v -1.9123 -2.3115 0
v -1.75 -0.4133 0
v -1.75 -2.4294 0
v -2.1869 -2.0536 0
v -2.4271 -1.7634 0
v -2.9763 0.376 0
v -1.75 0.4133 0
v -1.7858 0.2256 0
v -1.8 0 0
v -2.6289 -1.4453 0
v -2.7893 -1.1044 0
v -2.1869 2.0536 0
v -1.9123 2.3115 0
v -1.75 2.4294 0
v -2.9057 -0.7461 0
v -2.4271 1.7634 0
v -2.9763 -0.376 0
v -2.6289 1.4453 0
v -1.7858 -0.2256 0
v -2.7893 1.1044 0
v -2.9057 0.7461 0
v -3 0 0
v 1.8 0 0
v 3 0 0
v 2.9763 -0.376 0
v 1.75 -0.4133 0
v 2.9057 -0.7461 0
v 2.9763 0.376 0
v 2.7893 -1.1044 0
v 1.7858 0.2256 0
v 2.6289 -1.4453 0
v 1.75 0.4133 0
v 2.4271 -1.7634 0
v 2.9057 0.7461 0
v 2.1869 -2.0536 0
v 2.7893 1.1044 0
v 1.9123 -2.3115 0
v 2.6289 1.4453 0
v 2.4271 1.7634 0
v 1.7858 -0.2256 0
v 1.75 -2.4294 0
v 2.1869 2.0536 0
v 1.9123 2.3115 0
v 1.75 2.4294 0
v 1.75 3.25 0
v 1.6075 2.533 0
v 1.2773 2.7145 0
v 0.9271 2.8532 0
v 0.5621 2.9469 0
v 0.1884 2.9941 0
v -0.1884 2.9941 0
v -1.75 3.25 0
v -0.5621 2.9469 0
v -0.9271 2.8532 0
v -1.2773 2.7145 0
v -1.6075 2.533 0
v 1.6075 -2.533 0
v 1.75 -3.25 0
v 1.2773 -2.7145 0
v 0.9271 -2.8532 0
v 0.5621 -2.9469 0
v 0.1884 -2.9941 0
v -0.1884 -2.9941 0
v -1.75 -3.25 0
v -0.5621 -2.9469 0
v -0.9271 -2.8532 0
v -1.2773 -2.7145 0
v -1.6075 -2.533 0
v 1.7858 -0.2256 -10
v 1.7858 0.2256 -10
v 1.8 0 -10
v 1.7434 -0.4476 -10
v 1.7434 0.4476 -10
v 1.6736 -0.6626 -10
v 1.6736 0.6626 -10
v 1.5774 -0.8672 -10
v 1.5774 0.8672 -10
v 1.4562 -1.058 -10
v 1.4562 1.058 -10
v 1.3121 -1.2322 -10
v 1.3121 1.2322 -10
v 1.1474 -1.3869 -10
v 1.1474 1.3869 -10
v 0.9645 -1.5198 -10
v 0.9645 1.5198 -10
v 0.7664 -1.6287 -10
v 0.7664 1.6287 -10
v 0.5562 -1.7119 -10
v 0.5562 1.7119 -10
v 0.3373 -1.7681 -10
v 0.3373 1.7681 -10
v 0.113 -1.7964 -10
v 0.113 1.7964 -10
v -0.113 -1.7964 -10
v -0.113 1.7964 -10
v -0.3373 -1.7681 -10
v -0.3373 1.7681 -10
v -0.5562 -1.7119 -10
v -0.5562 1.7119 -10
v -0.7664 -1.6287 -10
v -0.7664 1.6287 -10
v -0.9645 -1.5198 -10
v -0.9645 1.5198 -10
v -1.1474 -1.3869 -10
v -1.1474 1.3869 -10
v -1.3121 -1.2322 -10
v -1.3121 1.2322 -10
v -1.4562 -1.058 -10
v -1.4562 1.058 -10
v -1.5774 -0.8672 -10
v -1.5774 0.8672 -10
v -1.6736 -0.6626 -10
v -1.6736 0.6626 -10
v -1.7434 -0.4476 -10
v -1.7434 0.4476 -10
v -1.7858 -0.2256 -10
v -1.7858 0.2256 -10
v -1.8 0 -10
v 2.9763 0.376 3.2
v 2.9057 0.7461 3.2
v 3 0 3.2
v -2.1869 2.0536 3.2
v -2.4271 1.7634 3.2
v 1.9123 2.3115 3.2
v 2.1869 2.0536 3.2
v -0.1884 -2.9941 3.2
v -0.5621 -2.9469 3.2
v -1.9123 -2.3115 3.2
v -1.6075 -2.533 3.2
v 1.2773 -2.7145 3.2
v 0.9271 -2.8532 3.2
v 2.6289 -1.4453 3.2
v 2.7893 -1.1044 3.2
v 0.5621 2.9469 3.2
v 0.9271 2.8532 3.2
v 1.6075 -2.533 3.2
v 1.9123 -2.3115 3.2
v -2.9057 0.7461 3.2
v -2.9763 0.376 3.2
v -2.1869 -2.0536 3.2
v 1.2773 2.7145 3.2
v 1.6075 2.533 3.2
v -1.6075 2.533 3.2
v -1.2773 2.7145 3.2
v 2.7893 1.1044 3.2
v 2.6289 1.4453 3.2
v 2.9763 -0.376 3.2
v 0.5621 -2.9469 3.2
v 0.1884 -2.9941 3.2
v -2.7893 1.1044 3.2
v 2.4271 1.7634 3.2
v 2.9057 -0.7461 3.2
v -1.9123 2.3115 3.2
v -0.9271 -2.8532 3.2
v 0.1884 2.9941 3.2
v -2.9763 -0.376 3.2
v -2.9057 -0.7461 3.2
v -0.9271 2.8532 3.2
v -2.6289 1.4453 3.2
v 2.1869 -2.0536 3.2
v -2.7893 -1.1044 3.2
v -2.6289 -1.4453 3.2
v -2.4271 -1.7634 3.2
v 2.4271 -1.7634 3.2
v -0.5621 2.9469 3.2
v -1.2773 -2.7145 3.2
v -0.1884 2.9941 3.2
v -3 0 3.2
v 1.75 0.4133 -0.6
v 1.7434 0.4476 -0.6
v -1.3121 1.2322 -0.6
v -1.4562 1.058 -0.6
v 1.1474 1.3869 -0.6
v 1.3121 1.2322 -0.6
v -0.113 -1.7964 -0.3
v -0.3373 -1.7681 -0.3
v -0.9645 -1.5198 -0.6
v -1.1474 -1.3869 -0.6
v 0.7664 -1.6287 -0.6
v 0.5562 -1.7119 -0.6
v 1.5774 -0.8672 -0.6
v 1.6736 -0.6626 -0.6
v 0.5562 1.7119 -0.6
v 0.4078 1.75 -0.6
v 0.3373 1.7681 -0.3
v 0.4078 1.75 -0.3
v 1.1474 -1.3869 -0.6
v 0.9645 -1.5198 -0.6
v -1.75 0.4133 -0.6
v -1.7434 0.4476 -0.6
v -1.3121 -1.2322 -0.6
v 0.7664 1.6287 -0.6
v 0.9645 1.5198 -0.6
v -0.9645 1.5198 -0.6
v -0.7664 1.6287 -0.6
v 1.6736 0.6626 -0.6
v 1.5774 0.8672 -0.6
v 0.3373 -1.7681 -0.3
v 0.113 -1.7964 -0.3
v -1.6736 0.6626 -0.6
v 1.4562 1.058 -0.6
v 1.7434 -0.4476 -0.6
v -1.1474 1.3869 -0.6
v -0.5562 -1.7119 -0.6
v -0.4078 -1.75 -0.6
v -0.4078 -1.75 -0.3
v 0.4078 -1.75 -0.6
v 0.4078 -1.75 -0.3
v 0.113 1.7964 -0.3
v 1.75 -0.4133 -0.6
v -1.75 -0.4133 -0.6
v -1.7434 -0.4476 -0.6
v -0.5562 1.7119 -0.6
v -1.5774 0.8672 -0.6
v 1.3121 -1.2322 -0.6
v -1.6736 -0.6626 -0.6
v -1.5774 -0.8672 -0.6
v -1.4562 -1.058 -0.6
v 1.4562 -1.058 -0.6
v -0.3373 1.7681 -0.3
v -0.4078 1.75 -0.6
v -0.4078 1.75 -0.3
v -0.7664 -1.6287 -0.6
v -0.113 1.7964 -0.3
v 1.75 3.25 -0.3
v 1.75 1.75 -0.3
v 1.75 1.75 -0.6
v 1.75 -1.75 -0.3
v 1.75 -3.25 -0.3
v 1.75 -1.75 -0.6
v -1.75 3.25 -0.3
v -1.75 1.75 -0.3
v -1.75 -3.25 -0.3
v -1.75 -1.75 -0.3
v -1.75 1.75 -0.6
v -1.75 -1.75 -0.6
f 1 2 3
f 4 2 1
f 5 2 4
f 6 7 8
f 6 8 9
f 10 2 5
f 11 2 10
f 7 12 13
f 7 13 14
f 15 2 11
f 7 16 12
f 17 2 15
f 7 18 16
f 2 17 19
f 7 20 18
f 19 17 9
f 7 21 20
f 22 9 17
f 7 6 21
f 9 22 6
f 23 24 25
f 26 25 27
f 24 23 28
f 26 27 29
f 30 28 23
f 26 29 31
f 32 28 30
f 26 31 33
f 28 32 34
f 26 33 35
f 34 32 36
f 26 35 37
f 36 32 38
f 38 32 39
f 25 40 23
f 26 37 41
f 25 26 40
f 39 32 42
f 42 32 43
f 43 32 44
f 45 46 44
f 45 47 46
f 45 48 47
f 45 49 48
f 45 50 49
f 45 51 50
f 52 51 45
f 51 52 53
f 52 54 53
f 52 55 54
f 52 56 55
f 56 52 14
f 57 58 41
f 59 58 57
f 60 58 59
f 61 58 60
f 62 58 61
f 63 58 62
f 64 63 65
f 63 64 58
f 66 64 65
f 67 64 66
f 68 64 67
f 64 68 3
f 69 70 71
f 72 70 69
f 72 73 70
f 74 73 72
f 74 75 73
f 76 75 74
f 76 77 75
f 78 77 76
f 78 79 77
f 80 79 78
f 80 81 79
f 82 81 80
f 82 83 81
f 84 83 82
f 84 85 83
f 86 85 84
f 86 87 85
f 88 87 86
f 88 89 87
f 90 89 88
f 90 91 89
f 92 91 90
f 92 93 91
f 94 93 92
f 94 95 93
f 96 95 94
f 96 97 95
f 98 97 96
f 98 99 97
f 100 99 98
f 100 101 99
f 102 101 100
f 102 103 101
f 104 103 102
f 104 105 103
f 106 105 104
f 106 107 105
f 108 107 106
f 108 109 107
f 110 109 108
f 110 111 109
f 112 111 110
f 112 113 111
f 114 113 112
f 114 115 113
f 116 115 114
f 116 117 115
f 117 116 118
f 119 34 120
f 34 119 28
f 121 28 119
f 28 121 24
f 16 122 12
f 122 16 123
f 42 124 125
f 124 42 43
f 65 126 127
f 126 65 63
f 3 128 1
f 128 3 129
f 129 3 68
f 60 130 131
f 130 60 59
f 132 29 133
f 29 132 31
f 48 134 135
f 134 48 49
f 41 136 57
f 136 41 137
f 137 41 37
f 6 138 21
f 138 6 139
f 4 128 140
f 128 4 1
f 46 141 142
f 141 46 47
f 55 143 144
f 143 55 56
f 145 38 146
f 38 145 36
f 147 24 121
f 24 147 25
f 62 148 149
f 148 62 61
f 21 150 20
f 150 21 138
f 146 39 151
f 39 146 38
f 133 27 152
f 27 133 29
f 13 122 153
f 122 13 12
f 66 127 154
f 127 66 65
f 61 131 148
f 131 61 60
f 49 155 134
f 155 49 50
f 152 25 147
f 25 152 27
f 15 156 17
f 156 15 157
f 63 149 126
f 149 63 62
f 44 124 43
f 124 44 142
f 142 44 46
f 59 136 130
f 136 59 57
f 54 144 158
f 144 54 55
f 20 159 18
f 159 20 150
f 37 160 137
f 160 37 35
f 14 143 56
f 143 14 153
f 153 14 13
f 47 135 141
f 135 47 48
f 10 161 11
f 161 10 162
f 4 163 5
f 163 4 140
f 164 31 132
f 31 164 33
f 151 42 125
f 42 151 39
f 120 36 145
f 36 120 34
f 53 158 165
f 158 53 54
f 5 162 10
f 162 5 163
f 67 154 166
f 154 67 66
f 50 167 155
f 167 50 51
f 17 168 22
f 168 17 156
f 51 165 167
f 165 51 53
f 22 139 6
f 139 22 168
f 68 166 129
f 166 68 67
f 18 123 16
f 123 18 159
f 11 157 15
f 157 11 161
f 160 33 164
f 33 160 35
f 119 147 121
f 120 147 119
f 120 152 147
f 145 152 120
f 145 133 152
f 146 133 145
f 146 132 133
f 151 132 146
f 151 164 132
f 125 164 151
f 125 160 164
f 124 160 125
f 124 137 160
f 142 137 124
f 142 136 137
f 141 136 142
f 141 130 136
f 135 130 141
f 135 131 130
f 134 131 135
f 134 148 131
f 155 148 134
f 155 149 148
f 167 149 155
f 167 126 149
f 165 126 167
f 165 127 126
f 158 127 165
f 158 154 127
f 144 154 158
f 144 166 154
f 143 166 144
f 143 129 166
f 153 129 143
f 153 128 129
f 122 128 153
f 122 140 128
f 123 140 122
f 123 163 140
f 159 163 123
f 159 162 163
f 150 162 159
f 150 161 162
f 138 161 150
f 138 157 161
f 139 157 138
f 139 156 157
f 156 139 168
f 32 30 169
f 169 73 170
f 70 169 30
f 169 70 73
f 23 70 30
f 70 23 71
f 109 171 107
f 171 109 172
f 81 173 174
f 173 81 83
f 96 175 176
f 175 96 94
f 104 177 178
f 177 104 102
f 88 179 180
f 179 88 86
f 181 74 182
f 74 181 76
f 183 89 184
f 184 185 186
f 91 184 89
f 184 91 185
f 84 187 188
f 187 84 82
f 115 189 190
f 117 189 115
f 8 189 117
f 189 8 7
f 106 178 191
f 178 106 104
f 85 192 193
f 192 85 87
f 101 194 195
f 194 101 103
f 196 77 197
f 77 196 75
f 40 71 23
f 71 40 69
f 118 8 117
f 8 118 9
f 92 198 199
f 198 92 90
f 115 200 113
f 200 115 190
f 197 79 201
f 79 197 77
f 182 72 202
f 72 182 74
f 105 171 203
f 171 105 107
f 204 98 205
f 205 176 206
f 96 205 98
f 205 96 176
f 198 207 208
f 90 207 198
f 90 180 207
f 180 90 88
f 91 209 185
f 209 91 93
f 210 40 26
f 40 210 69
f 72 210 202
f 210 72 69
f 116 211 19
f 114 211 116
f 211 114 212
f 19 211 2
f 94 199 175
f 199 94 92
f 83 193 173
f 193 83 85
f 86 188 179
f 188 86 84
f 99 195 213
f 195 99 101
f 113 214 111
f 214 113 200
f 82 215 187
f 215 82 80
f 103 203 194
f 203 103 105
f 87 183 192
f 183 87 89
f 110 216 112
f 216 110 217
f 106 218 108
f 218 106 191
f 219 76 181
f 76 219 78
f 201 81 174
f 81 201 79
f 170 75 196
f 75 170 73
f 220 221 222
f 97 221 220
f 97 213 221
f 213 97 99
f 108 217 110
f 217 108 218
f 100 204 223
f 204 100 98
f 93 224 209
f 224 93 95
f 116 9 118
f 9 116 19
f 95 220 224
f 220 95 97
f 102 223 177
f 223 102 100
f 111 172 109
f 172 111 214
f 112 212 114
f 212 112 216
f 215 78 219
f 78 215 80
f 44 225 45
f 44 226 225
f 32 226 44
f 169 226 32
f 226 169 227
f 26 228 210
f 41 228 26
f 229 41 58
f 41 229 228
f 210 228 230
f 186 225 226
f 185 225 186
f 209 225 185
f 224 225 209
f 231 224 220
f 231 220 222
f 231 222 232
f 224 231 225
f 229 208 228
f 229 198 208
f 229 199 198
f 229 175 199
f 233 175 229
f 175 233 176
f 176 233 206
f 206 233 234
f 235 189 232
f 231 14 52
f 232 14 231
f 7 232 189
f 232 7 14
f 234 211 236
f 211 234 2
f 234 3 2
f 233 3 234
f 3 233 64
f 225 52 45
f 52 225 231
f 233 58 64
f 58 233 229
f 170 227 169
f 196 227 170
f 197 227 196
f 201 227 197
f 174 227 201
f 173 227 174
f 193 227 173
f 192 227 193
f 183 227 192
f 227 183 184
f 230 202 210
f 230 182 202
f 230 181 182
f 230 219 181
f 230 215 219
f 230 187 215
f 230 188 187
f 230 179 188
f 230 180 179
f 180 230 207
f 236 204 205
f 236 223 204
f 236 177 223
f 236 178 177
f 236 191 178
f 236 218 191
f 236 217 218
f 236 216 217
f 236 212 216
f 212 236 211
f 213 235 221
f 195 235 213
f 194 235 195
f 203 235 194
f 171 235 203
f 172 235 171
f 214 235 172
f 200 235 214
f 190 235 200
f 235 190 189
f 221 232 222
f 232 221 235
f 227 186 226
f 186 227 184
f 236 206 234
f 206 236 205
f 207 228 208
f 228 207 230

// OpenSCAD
$fn = 50;


difference() {
	union() {
		translate(v = [0, 0, 0]) {
			rotate(a = [0, 0, 0]) {
				difference() {
					union() {
						translate(v = [0, 0, -10.0000000000]) {
							cylinder(h = 10, r = 1.5000000000);
						}
						cylinder(h = 3.2000000000, r = 3.0000000000);
						translate(v = [0, 0, -10.0000000000]) {
							cylinder(h = 10, r = 1.8000000000);
						}
						translate(v = [-1.7500000000, -3.2500000000, -0.3000000000]) {
							cube(size = [3.5000000000, 6.5000000000, 0.3000000000]);
						}
						translate(v = [-1.7500000000, -1.7500000000, -0.6000000000]) {
							cube(size = [3.5000000000, 3.5000000000, 0.3000000000]);
						}
						translate(v = [0, 0, -10.0000000000]) {
							cylinder(h = 10, r = 1.5000000000);
						}
					}
					union();
				}
			}
		}
	}
	union();
}
